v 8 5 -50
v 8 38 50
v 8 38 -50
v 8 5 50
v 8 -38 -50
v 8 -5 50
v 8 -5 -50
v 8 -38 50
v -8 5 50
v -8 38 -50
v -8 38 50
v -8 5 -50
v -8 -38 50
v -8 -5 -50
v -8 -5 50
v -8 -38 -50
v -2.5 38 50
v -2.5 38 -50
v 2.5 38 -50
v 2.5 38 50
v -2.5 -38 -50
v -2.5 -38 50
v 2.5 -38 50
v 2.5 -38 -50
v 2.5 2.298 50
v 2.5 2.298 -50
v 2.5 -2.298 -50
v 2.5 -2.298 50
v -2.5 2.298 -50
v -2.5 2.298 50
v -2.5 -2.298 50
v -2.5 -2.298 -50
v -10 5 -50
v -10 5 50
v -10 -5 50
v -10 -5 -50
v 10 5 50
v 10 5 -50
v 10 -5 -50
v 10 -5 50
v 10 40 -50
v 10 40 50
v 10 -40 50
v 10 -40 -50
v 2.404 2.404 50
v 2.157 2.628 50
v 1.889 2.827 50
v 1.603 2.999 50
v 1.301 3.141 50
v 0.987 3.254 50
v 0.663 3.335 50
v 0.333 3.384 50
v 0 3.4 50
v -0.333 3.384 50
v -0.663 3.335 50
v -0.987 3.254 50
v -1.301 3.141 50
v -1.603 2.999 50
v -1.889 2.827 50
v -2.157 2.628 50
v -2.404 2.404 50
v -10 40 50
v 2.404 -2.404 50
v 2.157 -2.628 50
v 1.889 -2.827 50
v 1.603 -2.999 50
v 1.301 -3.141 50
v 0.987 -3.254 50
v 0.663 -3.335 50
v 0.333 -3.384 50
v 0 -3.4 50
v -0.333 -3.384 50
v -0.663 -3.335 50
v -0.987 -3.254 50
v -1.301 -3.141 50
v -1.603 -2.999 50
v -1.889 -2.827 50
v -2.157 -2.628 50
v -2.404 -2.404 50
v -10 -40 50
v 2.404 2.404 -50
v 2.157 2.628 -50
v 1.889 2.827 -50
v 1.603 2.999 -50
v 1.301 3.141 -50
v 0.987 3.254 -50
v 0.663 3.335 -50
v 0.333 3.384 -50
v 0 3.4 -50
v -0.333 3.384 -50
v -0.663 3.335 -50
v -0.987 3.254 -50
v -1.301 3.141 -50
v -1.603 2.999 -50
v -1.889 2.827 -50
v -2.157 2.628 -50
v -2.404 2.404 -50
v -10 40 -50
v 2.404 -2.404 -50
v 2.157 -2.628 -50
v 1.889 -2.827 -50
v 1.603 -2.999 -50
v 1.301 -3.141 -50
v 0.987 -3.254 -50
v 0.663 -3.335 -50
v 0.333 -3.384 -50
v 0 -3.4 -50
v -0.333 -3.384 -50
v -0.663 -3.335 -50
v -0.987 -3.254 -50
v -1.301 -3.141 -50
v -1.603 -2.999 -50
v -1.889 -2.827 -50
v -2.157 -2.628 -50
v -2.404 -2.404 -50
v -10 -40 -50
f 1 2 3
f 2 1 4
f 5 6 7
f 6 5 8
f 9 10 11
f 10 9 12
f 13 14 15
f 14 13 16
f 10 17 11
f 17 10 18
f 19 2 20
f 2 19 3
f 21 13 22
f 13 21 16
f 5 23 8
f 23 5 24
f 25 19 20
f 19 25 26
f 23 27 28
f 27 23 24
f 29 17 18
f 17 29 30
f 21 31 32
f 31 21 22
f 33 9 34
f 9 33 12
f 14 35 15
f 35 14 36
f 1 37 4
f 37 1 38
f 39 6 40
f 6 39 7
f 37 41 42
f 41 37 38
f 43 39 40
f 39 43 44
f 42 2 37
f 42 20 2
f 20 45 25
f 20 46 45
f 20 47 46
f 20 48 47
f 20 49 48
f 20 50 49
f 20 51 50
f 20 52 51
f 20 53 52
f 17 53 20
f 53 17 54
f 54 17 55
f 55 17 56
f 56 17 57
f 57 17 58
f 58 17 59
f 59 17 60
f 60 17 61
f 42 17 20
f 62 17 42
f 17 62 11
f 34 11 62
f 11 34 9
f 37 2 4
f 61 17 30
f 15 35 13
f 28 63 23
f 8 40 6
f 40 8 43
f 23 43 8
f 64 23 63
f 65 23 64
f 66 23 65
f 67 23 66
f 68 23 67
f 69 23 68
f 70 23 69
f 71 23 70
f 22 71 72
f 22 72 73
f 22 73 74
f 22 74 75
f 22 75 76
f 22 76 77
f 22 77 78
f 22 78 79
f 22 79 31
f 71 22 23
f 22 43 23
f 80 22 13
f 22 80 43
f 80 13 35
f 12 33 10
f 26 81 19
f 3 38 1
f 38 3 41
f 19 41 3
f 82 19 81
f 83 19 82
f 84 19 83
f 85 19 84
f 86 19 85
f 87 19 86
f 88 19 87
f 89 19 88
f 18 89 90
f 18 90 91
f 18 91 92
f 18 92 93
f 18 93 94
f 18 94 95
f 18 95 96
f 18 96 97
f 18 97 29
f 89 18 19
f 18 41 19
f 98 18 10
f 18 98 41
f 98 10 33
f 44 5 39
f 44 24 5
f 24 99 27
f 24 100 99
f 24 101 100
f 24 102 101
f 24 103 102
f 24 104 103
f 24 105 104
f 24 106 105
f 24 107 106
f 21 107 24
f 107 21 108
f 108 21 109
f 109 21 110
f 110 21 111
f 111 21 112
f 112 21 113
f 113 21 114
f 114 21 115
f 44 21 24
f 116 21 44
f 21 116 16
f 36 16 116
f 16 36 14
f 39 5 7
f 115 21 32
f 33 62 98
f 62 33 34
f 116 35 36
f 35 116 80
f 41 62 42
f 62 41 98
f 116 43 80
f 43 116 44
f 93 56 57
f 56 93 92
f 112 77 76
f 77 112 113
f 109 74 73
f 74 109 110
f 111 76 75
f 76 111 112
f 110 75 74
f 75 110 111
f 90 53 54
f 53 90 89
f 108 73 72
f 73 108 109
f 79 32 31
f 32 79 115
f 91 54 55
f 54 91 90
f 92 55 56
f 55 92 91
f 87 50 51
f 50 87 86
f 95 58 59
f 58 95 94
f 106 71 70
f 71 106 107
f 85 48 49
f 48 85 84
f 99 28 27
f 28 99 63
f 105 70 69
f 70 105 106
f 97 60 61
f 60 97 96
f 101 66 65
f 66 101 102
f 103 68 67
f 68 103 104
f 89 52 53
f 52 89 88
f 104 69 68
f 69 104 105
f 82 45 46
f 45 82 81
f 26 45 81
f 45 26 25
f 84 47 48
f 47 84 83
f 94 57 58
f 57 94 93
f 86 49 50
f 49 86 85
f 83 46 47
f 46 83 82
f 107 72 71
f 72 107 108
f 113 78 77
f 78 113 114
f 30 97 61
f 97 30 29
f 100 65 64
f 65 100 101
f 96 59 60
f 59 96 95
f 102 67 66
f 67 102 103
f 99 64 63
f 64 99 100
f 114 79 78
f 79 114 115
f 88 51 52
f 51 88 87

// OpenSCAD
// 20x80 aluminium T-slot extrusion profile, 100mm long (single connected solid)
// FIX: ensure no mid-plane split / no floating internal bits by preserving a continuous
// center "spine" (material) through the inner void subtraction, with 1-2mm overlap.

profile_width_mm  = 20.0;   // X
profile_height_mm = 80.0;   // Y
length_mm         = 100.0;  // Z

wall_thickness_mm = 2.0;

// T-slot geometry (approximate)
slot_opening_mm   = 6.0;
slot_neck_mm      = 3.0;
slot_cavity_mm    = 10.0;
slot_depth_mm     = 6.0;

// Internal structure
center_bore_diameter_mm = 6.8;
web_thickness_mm        = 2.0;

// Overlap to guarantee attachment
overlap_mm = 1.5;

$fn = 64;

module extrusion_20x80(len=length_mm) {
    w  = profile_width_mm;
    h  = profile_height_mm;
    t  = wall_thickness_mm;
    wt = web_thickness_mm;

    // Clamp to keep geometry valid
    sd = min(slot_depth_mm, w/2 - t - 0.2);
    so = min(slot_opening_mm, h - 2*t - 0.2);
    sn = min(slot_neck_mm, so - 0.2);
    sc = min(slot_cavity_mm, so + 6);

    // Slot placement on the 20mm faces (left/right)
    cavity_xc = w/2 - (sd - sc/2);
    neck_xc   = w/2 - (sd - sn/2);
    open_xc   = w/2 - (t/2);

    inner_w = max(w - 2*t, 0.1);
    inner_h = max(h - 2*t, 0.1);

    // Ensure a continuous material bridge remains between left/right halves.
    // This "spine" is NOT subtracted from the outer body (i.e., it stays solid),
    // preventing any mid-plane separation.
    spine_w = max(wt + 2*overlap_mm, 1.0); // 1-2mm guaranteed overlap

    color("Silver")
    union() {
        difference() {
            // Outer body
            cube([w, h, len], center=true);

            // Inner void subtractor, but KEEP a central spine (material) so the body stays connected.
            // We subtract: (inner void MINUS spine) == difference(inner void, spine)
            difference() {
                cube([inner_w, inner_h, len + 2*overlap_mm], center=true);

                // Central spine to preserve material (connects left/right and prevents split)
                cube([spine_w, inner_h + 2*overlap_mm, len + 4*overlap_mm], center=true);
            }

            // T-slots on left/right faces
            for (sx = [-1, 1]) {
                // Opening cut (through outer wall thickness)
                translate([sx*open_xc, 0, 0])
                    cube([t + overlap_mm, so, len + 2*overlap_mm], center=true);

                // Neck cut
                translate([sx*neck_xc, 0, 0])
                    cube([sn, sn, len + 2*overlap_mm], center=true);

                // Cavity cut
                translate([sx*cavity_xc, 0, 0])
                    cube([sc, sc, len + 2*overlap_mm], center=true);
            }

            // Center bore
            cylinder(d=center_bore_diameter_mm, h=len + 2*overlap_mm, center=true);
        }
    }
}

extrusion_20x80(length_mm);
